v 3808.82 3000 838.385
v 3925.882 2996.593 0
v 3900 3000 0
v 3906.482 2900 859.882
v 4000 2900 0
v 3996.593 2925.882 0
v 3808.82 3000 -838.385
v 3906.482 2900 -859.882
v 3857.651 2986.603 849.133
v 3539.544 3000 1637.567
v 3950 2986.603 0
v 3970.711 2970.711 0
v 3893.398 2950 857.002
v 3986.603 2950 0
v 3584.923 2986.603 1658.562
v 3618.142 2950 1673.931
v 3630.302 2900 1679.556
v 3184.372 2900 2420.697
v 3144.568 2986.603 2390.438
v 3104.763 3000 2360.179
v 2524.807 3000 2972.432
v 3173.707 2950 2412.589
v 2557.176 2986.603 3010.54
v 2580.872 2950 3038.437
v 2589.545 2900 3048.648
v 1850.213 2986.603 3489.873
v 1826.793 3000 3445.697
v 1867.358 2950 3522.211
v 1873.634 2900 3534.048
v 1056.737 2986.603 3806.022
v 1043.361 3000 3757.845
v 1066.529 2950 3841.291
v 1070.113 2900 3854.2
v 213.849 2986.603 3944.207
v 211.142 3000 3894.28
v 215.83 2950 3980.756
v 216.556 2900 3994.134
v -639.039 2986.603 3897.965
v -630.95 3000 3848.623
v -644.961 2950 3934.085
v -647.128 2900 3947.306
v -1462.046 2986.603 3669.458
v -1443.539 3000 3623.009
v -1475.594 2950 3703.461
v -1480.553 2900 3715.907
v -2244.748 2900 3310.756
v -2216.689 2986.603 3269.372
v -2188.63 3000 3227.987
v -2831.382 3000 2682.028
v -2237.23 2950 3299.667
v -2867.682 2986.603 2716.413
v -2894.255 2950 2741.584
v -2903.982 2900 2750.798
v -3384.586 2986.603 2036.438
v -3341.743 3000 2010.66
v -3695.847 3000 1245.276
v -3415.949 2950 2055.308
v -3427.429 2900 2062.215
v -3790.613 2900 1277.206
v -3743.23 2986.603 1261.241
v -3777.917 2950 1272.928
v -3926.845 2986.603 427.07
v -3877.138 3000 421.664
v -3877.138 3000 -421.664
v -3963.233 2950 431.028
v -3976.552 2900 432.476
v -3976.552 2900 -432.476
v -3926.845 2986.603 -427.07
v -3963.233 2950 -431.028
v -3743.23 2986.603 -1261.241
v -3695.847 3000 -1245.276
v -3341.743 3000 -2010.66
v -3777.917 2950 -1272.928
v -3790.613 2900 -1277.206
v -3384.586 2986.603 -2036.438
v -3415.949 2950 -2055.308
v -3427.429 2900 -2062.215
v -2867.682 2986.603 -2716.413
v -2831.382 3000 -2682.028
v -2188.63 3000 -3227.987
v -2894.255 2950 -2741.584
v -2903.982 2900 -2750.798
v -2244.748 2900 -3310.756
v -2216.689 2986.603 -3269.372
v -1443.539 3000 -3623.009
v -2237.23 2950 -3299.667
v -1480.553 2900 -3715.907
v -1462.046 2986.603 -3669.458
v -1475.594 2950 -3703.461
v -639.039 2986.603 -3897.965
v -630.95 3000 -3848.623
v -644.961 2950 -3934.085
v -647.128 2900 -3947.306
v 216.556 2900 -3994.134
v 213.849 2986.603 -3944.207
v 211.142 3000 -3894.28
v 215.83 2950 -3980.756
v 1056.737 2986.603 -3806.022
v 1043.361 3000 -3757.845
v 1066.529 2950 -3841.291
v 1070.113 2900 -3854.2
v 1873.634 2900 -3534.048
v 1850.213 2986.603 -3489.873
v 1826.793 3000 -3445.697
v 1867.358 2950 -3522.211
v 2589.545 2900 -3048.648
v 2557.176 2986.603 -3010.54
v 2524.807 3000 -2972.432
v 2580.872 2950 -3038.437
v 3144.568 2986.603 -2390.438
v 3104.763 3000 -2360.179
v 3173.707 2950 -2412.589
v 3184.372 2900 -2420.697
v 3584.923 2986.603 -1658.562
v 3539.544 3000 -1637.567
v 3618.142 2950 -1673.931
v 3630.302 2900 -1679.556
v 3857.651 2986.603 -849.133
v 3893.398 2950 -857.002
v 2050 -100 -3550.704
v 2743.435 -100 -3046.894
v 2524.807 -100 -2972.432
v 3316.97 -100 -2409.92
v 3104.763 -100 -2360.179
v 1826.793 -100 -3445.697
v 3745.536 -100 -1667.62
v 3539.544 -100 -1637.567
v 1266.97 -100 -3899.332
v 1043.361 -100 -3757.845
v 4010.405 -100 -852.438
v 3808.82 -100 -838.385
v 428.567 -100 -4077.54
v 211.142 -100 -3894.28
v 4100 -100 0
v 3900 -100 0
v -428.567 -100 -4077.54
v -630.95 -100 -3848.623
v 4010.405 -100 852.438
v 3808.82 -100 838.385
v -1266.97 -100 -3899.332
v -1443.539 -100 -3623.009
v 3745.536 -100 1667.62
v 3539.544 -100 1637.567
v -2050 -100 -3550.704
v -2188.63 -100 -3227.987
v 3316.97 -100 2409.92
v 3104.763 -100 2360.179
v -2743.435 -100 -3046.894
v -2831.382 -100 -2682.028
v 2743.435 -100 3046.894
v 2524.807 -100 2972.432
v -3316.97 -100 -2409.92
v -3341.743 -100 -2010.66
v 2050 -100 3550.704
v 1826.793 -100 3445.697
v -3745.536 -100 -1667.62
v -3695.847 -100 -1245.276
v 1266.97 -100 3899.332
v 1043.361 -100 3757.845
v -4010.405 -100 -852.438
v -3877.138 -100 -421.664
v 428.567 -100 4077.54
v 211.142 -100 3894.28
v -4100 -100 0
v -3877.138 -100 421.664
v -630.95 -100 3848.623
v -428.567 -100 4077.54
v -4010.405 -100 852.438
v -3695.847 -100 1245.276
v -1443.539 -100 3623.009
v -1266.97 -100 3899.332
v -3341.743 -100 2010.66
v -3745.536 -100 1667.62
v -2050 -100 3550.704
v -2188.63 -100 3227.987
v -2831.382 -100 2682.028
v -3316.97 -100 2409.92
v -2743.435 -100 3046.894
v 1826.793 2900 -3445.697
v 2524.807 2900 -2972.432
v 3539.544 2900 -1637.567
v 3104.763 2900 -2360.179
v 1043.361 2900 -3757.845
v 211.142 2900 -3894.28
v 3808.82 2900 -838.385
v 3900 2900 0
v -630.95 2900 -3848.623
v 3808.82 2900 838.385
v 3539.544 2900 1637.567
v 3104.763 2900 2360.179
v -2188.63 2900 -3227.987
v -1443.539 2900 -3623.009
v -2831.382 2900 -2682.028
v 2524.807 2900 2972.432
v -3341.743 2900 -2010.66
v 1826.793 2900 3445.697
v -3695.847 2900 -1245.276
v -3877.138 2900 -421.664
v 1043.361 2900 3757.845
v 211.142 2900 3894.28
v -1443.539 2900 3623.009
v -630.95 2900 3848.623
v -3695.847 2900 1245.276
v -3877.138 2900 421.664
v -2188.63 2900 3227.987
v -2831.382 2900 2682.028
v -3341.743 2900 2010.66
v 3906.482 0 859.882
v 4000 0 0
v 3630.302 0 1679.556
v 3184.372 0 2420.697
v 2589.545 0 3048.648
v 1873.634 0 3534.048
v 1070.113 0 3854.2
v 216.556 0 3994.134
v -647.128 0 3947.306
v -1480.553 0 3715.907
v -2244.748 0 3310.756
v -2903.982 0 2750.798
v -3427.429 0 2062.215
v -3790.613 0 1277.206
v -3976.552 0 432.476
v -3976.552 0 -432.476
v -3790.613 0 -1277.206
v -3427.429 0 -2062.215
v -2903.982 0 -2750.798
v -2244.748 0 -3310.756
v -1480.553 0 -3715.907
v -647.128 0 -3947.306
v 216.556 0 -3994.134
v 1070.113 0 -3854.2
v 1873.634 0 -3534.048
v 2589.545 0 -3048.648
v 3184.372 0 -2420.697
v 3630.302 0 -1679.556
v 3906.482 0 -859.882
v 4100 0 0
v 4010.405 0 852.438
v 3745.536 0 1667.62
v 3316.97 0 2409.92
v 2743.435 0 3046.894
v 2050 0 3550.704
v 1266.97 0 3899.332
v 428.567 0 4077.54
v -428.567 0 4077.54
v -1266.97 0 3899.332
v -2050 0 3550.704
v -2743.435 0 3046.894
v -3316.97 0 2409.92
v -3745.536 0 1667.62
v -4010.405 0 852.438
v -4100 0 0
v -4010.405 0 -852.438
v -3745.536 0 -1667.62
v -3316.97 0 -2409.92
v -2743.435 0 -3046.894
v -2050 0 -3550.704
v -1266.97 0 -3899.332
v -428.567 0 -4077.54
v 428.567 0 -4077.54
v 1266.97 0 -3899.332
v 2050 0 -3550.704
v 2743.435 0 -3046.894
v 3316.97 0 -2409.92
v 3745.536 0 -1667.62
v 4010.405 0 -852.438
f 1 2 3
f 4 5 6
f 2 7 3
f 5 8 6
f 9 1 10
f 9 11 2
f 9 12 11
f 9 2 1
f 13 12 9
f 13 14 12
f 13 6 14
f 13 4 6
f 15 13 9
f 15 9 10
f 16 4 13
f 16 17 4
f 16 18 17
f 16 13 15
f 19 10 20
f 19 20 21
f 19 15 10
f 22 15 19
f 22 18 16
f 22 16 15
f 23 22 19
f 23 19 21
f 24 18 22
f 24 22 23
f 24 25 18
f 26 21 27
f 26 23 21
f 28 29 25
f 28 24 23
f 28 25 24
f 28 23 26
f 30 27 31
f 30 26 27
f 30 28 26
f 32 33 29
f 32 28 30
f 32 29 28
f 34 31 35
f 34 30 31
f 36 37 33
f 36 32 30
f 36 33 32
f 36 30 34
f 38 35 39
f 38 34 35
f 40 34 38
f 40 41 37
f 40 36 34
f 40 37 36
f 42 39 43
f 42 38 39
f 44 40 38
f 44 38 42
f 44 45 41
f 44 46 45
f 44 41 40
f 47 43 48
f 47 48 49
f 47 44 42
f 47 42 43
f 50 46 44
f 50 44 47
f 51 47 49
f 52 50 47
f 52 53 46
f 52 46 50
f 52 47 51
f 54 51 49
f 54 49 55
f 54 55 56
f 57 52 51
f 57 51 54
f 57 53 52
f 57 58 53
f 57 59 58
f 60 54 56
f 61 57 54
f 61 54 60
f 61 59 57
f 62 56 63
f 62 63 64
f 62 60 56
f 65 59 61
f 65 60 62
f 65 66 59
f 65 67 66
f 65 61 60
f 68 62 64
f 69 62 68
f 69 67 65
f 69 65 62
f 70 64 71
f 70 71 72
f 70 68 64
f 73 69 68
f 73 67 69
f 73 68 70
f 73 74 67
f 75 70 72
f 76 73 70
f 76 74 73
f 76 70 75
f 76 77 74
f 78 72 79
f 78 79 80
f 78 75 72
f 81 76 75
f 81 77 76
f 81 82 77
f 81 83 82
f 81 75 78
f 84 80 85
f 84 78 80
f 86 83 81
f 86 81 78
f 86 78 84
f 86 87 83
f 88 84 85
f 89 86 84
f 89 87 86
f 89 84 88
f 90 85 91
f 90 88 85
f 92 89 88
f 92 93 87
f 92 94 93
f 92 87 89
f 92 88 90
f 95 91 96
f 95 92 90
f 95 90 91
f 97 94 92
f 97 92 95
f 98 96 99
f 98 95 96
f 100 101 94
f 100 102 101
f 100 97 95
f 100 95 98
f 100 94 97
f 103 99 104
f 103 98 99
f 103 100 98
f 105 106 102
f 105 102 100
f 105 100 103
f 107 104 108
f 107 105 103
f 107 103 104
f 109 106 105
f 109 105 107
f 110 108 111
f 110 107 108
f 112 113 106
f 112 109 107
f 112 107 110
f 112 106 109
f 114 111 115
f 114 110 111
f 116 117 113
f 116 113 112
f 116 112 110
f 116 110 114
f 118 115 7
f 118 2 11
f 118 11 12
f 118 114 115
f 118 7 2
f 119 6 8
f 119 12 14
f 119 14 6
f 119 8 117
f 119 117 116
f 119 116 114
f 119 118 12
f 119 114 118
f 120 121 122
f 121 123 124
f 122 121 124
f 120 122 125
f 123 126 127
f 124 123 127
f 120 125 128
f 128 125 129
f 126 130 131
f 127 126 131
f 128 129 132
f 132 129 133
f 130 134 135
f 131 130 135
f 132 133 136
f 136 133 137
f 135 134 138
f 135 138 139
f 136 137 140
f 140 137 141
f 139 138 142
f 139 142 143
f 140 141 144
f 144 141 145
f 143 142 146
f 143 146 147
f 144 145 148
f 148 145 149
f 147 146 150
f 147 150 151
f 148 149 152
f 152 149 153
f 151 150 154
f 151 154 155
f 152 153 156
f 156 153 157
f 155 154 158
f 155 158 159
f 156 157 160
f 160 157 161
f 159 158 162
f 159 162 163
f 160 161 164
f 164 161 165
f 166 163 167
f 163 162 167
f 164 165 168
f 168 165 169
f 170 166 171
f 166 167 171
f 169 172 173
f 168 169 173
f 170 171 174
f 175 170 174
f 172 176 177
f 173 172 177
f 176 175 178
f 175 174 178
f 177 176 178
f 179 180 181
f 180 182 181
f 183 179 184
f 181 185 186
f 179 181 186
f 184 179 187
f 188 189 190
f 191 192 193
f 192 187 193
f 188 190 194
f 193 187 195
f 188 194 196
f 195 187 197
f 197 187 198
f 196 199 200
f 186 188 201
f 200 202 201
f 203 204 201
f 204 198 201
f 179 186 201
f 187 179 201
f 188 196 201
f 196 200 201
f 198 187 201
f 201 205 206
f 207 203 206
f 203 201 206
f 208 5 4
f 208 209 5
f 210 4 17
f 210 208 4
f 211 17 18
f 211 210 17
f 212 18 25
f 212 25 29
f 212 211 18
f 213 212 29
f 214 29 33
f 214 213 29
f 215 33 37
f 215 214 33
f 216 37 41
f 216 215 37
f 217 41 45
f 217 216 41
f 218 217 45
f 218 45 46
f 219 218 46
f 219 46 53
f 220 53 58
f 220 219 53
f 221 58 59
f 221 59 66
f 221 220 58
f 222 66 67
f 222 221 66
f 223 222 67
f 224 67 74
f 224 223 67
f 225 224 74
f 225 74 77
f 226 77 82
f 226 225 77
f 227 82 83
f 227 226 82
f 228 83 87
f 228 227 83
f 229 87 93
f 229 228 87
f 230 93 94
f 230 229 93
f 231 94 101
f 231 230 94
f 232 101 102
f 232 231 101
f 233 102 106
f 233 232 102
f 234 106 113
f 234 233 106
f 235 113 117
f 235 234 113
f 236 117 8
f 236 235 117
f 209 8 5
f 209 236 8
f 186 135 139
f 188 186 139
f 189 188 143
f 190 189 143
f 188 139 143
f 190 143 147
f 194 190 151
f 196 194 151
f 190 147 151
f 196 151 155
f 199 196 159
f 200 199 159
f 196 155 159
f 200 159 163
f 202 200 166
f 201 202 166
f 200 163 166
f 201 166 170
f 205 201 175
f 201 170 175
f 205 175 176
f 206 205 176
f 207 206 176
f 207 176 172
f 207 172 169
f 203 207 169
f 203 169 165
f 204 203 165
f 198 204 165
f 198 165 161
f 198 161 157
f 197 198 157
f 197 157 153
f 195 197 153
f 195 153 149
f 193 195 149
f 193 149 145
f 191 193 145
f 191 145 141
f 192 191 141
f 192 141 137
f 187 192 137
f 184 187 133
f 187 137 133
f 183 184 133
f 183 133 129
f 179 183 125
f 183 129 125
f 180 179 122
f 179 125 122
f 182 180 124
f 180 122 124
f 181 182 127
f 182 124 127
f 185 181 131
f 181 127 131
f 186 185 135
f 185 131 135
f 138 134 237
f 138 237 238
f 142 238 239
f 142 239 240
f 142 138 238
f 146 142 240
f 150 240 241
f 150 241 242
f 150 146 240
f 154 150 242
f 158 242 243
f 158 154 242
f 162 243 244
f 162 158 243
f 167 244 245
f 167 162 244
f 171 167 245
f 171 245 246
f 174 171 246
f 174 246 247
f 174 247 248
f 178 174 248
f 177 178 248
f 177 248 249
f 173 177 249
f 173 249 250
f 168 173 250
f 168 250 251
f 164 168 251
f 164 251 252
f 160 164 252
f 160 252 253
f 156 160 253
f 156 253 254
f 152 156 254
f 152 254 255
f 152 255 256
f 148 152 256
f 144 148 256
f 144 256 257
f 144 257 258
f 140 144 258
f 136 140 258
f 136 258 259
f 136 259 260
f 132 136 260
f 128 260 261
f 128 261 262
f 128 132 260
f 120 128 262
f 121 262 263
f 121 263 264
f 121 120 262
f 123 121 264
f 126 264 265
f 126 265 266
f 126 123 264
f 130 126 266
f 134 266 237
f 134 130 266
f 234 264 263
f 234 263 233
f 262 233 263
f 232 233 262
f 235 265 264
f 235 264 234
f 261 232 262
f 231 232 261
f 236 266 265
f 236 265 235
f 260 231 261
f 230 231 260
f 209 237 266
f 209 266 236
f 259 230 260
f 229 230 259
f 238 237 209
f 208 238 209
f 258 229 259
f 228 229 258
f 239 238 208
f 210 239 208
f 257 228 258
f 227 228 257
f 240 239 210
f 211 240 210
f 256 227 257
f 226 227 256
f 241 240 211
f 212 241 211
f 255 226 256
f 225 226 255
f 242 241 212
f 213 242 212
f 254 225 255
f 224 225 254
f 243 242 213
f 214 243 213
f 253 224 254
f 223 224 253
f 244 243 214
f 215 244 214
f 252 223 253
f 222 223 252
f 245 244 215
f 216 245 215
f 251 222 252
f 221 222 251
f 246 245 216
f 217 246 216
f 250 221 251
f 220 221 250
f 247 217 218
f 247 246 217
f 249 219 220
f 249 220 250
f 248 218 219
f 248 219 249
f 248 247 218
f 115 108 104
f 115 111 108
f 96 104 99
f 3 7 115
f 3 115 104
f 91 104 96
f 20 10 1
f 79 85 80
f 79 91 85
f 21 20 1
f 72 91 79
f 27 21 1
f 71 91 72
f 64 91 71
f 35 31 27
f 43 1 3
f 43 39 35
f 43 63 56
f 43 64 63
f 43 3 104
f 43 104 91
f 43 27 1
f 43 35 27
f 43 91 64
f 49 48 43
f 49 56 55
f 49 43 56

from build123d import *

# Parameters (mm, degrees)
THICKEN1_T2 = 100


with BuildPart() as body_1:
    # Surface-Revolve2: a surface, the sketch's curves turned about an axis
    with BuildLine(Plane.XY, mode=Mode.PRIVATE) as surface_revolve2_1_path:
        Line((0, 3000), (3900, 3000))
        ThreePointArc((3900, 3000), (3970.710678119, 2970.710678119), (4000, 2900))
        Line((4000, 2900), (4000, 0))
        Line((4000, 0), (4100, 0))
    surface_revolve2_1 = Shell.revolve(surface_revolve2_1_path.wire(), 360, Axis((0, 3000, 0), (0, -1, 0)))
    add(Solid.thicken(surface_revolve2_1, -THICKEN1_T2))


solid = body_1.part
